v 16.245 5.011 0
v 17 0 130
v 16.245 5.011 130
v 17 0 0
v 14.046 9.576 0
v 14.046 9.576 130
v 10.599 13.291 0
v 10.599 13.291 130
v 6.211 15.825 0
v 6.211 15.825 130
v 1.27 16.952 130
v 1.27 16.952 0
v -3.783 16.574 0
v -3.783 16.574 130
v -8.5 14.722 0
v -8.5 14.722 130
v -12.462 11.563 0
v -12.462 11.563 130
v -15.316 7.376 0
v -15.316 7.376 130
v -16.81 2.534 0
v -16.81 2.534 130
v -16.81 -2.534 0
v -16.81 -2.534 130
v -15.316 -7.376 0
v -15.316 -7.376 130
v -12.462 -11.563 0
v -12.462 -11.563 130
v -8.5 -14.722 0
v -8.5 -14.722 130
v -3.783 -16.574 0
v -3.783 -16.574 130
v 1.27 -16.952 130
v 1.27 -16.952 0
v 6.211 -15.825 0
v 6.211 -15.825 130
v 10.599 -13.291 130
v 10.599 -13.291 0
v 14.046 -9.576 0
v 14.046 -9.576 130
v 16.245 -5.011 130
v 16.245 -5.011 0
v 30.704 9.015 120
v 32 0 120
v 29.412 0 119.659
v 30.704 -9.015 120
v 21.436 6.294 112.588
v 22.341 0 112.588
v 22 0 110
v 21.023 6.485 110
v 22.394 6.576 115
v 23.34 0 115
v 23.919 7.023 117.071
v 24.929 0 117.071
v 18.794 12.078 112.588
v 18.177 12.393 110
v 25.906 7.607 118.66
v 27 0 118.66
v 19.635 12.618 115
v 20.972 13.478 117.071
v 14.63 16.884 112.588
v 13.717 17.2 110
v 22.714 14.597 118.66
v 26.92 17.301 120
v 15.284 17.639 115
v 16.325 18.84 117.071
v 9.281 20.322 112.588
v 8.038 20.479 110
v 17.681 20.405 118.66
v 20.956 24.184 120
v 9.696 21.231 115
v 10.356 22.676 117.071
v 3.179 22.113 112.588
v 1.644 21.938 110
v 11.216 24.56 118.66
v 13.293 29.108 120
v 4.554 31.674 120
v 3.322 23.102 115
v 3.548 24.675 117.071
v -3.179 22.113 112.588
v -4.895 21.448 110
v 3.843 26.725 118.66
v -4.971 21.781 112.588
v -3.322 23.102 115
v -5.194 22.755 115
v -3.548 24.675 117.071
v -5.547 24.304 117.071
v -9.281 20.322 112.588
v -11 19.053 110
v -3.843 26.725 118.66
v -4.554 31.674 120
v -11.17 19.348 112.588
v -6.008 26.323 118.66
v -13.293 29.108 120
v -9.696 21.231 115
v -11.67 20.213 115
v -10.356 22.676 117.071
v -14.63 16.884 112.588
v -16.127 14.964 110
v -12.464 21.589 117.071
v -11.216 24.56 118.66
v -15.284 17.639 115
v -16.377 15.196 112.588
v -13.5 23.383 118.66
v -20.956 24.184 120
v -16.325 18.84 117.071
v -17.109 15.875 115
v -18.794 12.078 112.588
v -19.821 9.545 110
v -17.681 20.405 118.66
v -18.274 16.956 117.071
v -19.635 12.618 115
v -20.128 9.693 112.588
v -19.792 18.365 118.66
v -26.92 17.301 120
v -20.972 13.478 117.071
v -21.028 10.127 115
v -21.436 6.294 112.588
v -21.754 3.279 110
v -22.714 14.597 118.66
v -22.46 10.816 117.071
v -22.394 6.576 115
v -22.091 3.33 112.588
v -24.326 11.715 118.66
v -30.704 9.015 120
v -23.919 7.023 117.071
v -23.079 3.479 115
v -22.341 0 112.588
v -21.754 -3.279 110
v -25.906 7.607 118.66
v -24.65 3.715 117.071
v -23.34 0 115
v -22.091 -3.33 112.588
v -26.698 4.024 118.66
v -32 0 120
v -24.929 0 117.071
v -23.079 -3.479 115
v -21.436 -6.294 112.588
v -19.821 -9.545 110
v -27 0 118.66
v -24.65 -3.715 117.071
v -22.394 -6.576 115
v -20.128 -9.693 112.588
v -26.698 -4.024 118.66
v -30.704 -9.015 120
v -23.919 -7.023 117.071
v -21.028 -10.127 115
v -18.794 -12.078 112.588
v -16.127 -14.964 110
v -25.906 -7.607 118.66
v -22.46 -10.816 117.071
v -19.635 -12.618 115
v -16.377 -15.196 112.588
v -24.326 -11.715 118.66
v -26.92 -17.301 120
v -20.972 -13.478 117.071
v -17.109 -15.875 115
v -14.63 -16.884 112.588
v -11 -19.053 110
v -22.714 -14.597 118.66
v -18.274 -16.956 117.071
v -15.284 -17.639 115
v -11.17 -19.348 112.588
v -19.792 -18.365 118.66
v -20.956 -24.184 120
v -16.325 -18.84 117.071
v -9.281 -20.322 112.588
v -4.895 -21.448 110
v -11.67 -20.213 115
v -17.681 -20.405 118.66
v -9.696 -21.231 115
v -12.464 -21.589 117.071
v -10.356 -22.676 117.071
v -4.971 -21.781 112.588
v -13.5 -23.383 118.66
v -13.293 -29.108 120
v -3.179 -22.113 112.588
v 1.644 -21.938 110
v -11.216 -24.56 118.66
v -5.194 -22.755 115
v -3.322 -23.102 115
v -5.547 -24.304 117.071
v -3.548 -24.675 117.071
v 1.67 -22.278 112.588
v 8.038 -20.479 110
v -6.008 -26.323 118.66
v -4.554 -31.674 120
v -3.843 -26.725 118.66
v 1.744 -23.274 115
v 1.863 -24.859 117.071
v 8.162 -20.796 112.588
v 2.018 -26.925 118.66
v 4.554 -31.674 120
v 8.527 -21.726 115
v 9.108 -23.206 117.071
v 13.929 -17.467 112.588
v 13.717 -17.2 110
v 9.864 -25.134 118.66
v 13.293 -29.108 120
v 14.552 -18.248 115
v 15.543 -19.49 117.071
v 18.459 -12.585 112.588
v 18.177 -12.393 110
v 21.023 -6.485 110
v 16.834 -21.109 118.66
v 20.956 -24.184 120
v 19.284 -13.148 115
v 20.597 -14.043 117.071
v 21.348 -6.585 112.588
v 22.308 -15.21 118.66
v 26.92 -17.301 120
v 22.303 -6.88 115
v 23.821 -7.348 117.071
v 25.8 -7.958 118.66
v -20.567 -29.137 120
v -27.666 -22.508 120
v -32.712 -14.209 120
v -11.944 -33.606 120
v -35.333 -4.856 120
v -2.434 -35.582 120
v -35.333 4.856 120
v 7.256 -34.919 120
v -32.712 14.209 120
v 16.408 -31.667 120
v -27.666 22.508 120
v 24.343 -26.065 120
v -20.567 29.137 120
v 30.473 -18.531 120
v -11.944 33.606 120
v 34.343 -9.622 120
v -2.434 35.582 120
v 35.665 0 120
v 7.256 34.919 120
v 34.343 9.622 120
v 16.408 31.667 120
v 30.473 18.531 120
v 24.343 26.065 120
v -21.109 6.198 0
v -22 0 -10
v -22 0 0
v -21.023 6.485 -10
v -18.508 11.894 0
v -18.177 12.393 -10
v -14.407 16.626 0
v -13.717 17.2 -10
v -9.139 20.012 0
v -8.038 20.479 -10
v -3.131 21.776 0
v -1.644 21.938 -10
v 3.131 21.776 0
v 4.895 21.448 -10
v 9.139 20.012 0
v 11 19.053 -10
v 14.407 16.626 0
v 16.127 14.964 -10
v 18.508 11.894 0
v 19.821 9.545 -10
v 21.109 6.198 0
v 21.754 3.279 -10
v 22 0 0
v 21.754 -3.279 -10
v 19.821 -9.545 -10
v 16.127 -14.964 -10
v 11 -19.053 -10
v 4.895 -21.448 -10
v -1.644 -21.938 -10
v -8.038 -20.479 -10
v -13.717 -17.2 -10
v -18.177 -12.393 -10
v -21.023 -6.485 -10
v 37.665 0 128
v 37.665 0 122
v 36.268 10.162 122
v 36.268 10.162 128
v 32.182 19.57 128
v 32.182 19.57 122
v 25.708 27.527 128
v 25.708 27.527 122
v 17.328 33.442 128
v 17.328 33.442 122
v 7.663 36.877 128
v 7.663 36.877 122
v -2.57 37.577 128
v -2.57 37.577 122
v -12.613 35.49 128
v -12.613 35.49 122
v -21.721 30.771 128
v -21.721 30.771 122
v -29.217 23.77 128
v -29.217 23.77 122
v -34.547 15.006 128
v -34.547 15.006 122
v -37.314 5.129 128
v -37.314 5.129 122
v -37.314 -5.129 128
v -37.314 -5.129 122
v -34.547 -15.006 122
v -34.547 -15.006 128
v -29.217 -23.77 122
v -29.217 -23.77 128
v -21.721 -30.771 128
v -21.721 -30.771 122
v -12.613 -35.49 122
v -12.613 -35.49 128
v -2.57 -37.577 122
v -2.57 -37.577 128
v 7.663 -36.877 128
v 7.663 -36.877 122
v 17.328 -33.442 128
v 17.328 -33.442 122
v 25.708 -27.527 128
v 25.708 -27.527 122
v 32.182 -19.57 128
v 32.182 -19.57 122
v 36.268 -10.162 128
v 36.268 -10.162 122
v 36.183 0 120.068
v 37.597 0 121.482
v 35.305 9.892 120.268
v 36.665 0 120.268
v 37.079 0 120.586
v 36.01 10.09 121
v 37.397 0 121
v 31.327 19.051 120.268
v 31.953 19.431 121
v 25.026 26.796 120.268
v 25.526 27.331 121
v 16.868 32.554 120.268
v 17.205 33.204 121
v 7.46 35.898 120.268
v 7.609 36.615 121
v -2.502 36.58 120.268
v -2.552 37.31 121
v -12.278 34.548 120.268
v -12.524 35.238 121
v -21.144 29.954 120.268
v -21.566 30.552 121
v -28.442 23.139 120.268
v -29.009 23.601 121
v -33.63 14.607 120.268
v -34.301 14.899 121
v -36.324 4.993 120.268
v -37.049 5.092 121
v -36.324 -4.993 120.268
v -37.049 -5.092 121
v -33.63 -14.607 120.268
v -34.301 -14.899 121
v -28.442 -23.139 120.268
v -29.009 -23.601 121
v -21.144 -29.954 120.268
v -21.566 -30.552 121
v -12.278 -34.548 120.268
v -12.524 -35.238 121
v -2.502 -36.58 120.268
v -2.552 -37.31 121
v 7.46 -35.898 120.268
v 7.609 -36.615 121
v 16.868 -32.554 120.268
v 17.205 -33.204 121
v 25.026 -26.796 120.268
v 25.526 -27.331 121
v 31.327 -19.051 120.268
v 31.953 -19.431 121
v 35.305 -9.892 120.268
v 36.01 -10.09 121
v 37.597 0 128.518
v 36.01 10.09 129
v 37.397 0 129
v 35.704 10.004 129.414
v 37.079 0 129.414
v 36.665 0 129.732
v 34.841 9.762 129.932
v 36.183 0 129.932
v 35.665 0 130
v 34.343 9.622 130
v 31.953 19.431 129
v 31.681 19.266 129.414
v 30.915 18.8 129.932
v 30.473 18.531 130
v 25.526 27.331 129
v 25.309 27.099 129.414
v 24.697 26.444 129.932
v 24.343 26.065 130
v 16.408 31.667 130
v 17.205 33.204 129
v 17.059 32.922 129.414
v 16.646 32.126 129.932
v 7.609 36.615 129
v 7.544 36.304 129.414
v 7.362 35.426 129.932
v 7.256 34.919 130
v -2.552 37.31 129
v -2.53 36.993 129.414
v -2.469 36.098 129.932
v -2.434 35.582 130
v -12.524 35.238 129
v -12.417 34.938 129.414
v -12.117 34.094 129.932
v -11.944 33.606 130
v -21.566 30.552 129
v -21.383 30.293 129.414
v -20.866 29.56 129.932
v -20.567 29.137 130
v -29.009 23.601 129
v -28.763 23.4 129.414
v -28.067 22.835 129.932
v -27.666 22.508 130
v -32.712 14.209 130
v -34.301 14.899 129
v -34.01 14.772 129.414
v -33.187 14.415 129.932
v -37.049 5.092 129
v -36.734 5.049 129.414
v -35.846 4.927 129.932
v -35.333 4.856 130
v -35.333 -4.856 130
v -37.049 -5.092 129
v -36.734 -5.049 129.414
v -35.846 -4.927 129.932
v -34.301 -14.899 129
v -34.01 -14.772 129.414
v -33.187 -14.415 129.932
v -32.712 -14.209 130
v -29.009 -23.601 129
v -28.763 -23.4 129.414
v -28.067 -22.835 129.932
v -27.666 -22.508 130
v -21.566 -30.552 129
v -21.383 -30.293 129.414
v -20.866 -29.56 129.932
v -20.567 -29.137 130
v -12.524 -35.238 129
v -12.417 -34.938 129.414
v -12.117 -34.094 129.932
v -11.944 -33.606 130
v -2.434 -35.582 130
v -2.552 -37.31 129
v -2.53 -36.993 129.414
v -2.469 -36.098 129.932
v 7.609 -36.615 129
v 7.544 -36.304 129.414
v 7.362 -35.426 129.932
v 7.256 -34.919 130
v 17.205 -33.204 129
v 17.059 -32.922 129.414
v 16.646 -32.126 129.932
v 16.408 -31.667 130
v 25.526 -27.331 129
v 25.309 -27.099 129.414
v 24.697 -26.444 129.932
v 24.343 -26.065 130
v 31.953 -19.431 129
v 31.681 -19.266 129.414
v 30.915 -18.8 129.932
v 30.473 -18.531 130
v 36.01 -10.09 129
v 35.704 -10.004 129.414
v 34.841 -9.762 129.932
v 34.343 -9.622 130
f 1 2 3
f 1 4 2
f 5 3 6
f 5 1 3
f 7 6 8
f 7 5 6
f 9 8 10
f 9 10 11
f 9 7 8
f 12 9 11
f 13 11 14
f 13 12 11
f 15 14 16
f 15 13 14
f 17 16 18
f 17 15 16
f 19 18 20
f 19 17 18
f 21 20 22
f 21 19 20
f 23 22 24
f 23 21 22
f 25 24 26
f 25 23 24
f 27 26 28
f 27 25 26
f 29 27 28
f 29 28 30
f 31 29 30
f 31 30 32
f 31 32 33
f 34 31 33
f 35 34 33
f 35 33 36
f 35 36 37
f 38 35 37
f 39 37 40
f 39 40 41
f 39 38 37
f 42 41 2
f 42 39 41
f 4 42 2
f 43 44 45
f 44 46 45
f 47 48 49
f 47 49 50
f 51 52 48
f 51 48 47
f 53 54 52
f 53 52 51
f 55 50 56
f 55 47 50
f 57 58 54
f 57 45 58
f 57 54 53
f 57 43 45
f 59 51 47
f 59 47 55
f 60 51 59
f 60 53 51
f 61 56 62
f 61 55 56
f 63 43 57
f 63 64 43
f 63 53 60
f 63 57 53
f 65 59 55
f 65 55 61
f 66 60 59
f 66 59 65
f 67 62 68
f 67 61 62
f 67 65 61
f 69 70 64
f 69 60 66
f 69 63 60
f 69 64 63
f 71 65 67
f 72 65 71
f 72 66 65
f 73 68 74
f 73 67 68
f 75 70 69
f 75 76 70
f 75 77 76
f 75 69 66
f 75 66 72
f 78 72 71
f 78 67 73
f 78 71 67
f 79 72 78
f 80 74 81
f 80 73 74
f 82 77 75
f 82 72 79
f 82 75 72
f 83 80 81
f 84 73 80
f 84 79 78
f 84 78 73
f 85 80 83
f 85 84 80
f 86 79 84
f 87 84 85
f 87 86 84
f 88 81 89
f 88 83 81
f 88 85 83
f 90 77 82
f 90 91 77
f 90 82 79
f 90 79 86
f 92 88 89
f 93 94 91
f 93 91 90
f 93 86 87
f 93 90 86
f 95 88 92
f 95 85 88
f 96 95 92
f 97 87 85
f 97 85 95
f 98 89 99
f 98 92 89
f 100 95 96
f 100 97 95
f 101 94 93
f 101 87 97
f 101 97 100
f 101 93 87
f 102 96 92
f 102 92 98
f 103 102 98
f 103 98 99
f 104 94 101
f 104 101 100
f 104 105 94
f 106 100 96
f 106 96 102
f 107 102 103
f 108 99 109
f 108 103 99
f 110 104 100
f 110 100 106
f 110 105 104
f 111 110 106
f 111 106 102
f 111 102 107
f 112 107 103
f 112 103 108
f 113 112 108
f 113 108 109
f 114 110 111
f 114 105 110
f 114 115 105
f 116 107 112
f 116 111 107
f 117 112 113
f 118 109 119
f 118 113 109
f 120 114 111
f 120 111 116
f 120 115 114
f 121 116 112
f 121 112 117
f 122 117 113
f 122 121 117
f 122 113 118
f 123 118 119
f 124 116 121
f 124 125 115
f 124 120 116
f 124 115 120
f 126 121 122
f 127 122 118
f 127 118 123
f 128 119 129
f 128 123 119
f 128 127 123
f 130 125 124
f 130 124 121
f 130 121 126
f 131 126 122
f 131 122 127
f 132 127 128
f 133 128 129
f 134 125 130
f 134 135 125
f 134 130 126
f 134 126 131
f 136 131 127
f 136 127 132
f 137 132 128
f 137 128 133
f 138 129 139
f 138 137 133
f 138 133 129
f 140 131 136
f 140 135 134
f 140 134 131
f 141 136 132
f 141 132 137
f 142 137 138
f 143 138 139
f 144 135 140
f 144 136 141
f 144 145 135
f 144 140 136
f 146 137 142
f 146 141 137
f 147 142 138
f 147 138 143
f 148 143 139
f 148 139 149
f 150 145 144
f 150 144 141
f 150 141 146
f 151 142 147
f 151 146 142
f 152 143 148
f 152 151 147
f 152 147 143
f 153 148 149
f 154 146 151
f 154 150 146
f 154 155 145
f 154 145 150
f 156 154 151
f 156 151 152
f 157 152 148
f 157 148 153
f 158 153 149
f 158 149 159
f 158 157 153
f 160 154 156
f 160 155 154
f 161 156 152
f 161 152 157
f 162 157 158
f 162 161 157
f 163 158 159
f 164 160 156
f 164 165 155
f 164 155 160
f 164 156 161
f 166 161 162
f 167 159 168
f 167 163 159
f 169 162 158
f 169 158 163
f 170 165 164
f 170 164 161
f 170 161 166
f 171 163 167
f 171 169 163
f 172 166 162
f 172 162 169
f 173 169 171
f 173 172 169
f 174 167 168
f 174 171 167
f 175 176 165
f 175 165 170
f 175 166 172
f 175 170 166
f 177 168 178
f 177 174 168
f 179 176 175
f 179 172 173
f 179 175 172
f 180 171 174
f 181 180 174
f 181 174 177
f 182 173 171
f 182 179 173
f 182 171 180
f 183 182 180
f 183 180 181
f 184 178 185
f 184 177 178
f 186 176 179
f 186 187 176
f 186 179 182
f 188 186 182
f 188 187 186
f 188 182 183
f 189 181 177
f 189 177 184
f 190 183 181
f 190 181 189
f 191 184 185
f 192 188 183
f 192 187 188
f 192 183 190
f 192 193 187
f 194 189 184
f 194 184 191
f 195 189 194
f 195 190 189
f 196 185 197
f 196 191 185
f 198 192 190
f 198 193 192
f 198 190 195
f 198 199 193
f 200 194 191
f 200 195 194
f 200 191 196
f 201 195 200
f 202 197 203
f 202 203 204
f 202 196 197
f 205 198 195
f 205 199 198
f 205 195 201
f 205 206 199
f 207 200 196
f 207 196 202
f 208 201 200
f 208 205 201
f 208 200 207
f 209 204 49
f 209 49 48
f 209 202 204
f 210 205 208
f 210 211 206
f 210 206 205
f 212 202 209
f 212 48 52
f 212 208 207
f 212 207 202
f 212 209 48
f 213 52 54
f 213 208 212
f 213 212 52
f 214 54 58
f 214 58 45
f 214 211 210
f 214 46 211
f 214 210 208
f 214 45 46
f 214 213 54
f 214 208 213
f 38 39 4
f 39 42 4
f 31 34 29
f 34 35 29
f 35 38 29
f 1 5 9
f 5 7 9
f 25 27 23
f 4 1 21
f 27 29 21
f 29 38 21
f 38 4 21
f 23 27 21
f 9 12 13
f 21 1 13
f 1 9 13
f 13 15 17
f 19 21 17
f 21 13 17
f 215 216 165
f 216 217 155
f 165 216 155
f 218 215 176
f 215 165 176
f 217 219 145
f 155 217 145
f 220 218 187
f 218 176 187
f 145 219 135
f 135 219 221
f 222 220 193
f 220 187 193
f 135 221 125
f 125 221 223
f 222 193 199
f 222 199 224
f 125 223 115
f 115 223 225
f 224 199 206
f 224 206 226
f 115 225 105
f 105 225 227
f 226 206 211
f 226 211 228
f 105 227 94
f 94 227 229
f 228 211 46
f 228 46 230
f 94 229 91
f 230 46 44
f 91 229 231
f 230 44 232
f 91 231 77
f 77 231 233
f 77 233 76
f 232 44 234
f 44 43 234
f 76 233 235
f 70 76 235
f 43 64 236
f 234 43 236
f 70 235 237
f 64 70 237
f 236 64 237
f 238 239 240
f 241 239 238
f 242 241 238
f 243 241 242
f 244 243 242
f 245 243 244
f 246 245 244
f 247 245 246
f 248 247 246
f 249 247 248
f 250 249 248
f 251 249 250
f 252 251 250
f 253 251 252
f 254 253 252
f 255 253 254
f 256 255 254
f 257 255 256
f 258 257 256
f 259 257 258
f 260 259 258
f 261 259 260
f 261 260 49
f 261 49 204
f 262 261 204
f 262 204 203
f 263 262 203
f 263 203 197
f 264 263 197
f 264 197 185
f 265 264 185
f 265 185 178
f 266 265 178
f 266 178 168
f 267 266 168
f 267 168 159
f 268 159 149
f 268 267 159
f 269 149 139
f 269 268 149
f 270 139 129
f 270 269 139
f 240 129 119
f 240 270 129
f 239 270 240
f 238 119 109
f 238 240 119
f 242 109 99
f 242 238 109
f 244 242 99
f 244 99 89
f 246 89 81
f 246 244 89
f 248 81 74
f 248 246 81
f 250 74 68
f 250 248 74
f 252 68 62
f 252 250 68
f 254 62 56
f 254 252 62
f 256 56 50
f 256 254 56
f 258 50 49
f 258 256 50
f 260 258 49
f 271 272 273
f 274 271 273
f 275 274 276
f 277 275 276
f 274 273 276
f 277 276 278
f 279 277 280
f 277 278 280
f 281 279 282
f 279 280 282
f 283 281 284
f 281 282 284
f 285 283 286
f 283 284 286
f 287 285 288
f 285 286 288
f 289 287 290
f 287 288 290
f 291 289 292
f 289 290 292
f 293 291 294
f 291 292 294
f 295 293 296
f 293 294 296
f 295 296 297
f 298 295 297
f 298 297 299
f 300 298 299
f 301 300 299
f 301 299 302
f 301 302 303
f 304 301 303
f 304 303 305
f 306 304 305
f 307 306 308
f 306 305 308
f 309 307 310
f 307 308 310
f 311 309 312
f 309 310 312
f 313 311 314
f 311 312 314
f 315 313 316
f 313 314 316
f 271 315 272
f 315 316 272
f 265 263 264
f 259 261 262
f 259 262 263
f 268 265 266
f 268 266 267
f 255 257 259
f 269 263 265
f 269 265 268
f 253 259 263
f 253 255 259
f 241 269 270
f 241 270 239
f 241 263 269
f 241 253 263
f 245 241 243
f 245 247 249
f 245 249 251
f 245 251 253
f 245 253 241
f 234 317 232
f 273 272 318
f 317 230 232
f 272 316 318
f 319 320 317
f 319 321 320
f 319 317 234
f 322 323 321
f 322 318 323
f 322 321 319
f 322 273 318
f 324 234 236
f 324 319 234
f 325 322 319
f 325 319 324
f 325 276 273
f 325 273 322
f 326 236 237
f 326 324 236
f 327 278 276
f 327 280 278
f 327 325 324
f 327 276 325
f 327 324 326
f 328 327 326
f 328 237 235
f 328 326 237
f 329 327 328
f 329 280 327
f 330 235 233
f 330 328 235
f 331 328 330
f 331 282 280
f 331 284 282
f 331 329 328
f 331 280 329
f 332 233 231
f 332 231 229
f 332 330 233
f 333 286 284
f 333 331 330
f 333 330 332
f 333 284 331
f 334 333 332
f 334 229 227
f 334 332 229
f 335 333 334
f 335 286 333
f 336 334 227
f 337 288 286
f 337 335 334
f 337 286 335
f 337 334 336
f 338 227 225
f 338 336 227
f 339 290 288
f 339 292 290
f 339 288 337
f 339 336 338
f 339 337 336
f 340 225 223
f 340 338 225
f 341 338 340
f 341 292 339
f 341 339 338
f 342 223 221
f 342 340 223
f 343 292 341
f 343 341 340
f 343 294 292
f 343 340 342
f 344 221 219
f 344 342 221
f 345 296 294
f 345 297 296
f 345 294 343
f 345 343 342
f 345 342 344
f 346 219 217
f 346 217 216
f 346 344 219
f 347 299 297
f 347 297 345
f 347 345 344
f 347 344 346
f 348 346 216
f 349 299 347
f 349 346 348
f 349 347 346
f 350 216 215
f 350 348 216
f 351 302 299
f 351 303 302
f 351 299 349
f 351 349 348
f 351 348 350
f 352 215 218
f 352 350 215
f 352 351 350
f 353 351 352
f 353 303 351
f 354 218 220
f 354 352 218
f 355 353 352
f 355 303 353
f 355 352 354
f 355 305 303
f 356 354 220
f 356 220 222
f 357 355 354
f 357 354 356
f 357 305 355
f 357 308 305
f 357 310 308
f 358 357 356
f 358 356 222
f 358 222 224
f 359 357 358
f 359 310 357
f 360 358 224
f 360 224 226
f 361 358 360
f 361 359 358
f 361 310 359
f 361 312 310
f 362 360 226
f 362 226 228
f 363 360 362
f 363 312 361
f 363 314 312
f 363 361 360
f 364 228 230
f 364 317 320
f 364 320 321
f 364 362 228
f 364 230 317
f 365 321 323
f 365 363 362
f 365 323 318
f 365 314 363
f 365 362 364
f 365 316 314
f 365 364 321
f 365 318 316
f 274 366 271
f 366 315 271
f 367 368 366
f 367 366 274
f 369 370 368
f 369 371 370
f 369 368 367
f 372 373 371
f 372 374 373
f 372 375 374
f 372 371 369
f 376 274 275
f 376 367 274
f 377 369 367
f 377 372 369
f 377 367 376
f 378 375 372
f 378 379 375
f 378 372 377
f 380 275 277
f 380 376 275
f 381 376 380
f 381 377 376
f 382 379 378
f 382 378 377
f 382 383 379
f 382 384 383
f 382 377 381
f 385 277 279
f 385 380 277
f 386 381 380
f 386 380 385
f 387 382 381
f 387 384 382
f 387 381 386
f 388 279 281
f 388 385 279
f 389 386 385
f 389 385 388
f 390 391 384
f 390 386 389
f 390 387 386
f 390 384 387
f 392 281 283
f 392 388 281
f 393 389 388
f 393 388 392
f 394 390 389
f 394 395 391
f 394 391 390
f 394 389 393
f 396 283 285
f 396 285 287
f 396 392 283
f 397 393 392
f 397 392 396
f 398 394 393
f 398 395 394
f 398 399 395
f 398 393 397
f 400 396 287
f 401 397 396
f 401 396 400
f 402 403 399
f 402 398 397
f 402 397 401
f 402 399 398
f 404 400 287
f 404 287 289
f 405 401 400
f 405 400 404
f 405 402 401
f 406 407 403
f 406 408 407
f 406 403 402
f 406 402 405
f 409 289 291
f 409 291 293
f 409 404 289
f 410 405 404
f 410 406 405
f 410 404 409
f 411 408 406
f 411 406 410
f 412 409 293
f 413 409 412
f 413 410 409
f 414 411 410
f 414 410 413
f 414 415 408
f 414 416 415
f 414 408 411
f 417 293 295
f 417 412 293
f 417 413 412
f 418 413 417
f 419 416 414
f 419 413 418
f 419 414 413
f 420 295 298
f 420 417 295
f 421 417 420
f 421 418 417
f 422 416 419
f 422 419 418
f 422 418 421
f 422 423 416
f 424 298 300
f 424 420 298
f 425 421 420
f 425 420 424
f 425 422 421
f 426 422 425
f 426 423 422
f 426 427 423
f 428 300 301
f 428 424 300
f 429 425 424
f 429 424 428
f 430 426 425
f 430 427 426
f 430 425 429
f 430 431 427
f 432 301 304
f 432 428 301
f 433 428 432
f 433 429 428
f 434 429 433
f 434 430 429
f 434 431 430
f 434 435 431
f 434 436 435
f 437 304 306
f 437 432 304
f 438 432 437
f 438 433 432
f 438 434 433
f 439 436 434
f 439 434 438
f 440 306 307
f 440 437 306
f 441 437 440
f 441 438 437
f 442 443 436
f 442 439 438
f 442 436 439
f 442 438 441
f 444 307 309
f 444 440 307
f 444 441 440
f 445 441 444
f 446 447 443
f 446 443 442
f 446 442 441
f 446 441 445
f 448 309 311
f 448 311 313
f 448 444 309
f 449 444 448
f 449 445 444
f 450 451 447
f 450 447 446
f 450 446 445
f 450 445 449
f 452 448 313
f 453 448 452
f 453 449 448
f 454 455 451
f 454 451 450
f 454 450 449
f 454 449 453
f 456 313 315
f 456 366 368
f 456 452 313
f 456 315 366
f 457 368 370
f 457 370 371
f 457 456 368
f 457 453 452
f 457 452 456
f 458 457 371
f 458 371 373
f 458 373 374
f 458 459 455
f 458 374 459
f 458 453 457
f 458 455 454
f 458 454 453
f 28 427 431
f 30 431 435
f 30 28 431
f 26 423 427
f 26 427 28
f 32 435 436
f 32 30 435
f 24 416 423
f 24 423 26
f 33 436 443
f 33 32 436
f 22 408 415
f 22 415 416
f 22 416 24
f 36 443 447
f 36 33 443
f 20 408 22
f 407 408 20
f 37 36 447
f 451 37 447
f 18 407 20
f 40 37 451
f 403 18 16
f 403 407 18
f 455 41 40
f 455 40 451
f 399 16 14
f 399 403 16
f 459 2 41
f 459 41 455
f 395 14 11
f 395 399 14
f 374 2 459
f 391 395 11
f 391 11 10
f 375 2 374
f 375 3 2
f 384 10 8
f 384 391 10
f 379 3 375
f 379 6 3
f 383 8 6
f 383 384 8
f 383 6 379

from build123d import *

# Parameters (mm, degrees)
ESBO_O1_R                = 22
ESBO_O1_R_2              = 17
RESSALTO_EXTRUS_O1_DEPTH = 120
ESBO_O2_R                = 37.66512487
ESBO_O2_R_2              = 17
RESSALTO_EXTRUS_O2_DEPTH = 10
FILETE1_R                = 10
FILETE2_R                = 2
RESSALTO_EXTRUS_O3_START = 10
ESBO_O3_R                = 22
RESSALTO_EXTRUS_O3_DEPTH = 10


with BuildPart() as part:
    # Esboço1 → Ressalto-extrusão1 (new body)
    with BuildSketch(Plane.XY):
        Circle(ESBO_O1_R)
        Circle(ESBO_O1_R_2, mode=Mode.SUBTRACT)
    extrude(amount=RESSALTO_EXTRUS_O1_DEPTH)

    # Esboço2 → Ressalto-extrusão2 (add)
    with BuildSketch(Plane.XY.offset(120)):
        Circle(ESBO_O2_R)
        Circle(ESBO_O2_R_2, mode=Mode.SUBTRACT)
    extrude(amount=RESSALTO_EXTRUS_O2_DEPTH)

    # Filete1
    filete1_edges = [part.edges().sort_by_distance(p)[0] for p in [
        (-22, 0, 120),
    ]]
    fillet(filete1_edges, radius=FILETE1_R)

    # Filete2
    filete2_edges = [part.edges().sort_by_distance(p)[0] for p in [
        (-37.66512487, 0, 130),
        (-37.66512487, 0, 120),
    ]]
    fillet(filete2_edges, radius=FILETE2_R)

    # Esboço3 → Ressalto-extrusão3 (add)
    with BuildSketch(Plane(origin=(0, 0, 0), x_dir=(-1, 0, 0), z_dir=(0, 0, -1)).offset(RESSALTO_EXTRUS_O3_START)):
        Circle(ESBO_O3_R)
    extrude(amount=-RESSALTO_EXTRUS_O3_DEPTH)


solid = part.part
